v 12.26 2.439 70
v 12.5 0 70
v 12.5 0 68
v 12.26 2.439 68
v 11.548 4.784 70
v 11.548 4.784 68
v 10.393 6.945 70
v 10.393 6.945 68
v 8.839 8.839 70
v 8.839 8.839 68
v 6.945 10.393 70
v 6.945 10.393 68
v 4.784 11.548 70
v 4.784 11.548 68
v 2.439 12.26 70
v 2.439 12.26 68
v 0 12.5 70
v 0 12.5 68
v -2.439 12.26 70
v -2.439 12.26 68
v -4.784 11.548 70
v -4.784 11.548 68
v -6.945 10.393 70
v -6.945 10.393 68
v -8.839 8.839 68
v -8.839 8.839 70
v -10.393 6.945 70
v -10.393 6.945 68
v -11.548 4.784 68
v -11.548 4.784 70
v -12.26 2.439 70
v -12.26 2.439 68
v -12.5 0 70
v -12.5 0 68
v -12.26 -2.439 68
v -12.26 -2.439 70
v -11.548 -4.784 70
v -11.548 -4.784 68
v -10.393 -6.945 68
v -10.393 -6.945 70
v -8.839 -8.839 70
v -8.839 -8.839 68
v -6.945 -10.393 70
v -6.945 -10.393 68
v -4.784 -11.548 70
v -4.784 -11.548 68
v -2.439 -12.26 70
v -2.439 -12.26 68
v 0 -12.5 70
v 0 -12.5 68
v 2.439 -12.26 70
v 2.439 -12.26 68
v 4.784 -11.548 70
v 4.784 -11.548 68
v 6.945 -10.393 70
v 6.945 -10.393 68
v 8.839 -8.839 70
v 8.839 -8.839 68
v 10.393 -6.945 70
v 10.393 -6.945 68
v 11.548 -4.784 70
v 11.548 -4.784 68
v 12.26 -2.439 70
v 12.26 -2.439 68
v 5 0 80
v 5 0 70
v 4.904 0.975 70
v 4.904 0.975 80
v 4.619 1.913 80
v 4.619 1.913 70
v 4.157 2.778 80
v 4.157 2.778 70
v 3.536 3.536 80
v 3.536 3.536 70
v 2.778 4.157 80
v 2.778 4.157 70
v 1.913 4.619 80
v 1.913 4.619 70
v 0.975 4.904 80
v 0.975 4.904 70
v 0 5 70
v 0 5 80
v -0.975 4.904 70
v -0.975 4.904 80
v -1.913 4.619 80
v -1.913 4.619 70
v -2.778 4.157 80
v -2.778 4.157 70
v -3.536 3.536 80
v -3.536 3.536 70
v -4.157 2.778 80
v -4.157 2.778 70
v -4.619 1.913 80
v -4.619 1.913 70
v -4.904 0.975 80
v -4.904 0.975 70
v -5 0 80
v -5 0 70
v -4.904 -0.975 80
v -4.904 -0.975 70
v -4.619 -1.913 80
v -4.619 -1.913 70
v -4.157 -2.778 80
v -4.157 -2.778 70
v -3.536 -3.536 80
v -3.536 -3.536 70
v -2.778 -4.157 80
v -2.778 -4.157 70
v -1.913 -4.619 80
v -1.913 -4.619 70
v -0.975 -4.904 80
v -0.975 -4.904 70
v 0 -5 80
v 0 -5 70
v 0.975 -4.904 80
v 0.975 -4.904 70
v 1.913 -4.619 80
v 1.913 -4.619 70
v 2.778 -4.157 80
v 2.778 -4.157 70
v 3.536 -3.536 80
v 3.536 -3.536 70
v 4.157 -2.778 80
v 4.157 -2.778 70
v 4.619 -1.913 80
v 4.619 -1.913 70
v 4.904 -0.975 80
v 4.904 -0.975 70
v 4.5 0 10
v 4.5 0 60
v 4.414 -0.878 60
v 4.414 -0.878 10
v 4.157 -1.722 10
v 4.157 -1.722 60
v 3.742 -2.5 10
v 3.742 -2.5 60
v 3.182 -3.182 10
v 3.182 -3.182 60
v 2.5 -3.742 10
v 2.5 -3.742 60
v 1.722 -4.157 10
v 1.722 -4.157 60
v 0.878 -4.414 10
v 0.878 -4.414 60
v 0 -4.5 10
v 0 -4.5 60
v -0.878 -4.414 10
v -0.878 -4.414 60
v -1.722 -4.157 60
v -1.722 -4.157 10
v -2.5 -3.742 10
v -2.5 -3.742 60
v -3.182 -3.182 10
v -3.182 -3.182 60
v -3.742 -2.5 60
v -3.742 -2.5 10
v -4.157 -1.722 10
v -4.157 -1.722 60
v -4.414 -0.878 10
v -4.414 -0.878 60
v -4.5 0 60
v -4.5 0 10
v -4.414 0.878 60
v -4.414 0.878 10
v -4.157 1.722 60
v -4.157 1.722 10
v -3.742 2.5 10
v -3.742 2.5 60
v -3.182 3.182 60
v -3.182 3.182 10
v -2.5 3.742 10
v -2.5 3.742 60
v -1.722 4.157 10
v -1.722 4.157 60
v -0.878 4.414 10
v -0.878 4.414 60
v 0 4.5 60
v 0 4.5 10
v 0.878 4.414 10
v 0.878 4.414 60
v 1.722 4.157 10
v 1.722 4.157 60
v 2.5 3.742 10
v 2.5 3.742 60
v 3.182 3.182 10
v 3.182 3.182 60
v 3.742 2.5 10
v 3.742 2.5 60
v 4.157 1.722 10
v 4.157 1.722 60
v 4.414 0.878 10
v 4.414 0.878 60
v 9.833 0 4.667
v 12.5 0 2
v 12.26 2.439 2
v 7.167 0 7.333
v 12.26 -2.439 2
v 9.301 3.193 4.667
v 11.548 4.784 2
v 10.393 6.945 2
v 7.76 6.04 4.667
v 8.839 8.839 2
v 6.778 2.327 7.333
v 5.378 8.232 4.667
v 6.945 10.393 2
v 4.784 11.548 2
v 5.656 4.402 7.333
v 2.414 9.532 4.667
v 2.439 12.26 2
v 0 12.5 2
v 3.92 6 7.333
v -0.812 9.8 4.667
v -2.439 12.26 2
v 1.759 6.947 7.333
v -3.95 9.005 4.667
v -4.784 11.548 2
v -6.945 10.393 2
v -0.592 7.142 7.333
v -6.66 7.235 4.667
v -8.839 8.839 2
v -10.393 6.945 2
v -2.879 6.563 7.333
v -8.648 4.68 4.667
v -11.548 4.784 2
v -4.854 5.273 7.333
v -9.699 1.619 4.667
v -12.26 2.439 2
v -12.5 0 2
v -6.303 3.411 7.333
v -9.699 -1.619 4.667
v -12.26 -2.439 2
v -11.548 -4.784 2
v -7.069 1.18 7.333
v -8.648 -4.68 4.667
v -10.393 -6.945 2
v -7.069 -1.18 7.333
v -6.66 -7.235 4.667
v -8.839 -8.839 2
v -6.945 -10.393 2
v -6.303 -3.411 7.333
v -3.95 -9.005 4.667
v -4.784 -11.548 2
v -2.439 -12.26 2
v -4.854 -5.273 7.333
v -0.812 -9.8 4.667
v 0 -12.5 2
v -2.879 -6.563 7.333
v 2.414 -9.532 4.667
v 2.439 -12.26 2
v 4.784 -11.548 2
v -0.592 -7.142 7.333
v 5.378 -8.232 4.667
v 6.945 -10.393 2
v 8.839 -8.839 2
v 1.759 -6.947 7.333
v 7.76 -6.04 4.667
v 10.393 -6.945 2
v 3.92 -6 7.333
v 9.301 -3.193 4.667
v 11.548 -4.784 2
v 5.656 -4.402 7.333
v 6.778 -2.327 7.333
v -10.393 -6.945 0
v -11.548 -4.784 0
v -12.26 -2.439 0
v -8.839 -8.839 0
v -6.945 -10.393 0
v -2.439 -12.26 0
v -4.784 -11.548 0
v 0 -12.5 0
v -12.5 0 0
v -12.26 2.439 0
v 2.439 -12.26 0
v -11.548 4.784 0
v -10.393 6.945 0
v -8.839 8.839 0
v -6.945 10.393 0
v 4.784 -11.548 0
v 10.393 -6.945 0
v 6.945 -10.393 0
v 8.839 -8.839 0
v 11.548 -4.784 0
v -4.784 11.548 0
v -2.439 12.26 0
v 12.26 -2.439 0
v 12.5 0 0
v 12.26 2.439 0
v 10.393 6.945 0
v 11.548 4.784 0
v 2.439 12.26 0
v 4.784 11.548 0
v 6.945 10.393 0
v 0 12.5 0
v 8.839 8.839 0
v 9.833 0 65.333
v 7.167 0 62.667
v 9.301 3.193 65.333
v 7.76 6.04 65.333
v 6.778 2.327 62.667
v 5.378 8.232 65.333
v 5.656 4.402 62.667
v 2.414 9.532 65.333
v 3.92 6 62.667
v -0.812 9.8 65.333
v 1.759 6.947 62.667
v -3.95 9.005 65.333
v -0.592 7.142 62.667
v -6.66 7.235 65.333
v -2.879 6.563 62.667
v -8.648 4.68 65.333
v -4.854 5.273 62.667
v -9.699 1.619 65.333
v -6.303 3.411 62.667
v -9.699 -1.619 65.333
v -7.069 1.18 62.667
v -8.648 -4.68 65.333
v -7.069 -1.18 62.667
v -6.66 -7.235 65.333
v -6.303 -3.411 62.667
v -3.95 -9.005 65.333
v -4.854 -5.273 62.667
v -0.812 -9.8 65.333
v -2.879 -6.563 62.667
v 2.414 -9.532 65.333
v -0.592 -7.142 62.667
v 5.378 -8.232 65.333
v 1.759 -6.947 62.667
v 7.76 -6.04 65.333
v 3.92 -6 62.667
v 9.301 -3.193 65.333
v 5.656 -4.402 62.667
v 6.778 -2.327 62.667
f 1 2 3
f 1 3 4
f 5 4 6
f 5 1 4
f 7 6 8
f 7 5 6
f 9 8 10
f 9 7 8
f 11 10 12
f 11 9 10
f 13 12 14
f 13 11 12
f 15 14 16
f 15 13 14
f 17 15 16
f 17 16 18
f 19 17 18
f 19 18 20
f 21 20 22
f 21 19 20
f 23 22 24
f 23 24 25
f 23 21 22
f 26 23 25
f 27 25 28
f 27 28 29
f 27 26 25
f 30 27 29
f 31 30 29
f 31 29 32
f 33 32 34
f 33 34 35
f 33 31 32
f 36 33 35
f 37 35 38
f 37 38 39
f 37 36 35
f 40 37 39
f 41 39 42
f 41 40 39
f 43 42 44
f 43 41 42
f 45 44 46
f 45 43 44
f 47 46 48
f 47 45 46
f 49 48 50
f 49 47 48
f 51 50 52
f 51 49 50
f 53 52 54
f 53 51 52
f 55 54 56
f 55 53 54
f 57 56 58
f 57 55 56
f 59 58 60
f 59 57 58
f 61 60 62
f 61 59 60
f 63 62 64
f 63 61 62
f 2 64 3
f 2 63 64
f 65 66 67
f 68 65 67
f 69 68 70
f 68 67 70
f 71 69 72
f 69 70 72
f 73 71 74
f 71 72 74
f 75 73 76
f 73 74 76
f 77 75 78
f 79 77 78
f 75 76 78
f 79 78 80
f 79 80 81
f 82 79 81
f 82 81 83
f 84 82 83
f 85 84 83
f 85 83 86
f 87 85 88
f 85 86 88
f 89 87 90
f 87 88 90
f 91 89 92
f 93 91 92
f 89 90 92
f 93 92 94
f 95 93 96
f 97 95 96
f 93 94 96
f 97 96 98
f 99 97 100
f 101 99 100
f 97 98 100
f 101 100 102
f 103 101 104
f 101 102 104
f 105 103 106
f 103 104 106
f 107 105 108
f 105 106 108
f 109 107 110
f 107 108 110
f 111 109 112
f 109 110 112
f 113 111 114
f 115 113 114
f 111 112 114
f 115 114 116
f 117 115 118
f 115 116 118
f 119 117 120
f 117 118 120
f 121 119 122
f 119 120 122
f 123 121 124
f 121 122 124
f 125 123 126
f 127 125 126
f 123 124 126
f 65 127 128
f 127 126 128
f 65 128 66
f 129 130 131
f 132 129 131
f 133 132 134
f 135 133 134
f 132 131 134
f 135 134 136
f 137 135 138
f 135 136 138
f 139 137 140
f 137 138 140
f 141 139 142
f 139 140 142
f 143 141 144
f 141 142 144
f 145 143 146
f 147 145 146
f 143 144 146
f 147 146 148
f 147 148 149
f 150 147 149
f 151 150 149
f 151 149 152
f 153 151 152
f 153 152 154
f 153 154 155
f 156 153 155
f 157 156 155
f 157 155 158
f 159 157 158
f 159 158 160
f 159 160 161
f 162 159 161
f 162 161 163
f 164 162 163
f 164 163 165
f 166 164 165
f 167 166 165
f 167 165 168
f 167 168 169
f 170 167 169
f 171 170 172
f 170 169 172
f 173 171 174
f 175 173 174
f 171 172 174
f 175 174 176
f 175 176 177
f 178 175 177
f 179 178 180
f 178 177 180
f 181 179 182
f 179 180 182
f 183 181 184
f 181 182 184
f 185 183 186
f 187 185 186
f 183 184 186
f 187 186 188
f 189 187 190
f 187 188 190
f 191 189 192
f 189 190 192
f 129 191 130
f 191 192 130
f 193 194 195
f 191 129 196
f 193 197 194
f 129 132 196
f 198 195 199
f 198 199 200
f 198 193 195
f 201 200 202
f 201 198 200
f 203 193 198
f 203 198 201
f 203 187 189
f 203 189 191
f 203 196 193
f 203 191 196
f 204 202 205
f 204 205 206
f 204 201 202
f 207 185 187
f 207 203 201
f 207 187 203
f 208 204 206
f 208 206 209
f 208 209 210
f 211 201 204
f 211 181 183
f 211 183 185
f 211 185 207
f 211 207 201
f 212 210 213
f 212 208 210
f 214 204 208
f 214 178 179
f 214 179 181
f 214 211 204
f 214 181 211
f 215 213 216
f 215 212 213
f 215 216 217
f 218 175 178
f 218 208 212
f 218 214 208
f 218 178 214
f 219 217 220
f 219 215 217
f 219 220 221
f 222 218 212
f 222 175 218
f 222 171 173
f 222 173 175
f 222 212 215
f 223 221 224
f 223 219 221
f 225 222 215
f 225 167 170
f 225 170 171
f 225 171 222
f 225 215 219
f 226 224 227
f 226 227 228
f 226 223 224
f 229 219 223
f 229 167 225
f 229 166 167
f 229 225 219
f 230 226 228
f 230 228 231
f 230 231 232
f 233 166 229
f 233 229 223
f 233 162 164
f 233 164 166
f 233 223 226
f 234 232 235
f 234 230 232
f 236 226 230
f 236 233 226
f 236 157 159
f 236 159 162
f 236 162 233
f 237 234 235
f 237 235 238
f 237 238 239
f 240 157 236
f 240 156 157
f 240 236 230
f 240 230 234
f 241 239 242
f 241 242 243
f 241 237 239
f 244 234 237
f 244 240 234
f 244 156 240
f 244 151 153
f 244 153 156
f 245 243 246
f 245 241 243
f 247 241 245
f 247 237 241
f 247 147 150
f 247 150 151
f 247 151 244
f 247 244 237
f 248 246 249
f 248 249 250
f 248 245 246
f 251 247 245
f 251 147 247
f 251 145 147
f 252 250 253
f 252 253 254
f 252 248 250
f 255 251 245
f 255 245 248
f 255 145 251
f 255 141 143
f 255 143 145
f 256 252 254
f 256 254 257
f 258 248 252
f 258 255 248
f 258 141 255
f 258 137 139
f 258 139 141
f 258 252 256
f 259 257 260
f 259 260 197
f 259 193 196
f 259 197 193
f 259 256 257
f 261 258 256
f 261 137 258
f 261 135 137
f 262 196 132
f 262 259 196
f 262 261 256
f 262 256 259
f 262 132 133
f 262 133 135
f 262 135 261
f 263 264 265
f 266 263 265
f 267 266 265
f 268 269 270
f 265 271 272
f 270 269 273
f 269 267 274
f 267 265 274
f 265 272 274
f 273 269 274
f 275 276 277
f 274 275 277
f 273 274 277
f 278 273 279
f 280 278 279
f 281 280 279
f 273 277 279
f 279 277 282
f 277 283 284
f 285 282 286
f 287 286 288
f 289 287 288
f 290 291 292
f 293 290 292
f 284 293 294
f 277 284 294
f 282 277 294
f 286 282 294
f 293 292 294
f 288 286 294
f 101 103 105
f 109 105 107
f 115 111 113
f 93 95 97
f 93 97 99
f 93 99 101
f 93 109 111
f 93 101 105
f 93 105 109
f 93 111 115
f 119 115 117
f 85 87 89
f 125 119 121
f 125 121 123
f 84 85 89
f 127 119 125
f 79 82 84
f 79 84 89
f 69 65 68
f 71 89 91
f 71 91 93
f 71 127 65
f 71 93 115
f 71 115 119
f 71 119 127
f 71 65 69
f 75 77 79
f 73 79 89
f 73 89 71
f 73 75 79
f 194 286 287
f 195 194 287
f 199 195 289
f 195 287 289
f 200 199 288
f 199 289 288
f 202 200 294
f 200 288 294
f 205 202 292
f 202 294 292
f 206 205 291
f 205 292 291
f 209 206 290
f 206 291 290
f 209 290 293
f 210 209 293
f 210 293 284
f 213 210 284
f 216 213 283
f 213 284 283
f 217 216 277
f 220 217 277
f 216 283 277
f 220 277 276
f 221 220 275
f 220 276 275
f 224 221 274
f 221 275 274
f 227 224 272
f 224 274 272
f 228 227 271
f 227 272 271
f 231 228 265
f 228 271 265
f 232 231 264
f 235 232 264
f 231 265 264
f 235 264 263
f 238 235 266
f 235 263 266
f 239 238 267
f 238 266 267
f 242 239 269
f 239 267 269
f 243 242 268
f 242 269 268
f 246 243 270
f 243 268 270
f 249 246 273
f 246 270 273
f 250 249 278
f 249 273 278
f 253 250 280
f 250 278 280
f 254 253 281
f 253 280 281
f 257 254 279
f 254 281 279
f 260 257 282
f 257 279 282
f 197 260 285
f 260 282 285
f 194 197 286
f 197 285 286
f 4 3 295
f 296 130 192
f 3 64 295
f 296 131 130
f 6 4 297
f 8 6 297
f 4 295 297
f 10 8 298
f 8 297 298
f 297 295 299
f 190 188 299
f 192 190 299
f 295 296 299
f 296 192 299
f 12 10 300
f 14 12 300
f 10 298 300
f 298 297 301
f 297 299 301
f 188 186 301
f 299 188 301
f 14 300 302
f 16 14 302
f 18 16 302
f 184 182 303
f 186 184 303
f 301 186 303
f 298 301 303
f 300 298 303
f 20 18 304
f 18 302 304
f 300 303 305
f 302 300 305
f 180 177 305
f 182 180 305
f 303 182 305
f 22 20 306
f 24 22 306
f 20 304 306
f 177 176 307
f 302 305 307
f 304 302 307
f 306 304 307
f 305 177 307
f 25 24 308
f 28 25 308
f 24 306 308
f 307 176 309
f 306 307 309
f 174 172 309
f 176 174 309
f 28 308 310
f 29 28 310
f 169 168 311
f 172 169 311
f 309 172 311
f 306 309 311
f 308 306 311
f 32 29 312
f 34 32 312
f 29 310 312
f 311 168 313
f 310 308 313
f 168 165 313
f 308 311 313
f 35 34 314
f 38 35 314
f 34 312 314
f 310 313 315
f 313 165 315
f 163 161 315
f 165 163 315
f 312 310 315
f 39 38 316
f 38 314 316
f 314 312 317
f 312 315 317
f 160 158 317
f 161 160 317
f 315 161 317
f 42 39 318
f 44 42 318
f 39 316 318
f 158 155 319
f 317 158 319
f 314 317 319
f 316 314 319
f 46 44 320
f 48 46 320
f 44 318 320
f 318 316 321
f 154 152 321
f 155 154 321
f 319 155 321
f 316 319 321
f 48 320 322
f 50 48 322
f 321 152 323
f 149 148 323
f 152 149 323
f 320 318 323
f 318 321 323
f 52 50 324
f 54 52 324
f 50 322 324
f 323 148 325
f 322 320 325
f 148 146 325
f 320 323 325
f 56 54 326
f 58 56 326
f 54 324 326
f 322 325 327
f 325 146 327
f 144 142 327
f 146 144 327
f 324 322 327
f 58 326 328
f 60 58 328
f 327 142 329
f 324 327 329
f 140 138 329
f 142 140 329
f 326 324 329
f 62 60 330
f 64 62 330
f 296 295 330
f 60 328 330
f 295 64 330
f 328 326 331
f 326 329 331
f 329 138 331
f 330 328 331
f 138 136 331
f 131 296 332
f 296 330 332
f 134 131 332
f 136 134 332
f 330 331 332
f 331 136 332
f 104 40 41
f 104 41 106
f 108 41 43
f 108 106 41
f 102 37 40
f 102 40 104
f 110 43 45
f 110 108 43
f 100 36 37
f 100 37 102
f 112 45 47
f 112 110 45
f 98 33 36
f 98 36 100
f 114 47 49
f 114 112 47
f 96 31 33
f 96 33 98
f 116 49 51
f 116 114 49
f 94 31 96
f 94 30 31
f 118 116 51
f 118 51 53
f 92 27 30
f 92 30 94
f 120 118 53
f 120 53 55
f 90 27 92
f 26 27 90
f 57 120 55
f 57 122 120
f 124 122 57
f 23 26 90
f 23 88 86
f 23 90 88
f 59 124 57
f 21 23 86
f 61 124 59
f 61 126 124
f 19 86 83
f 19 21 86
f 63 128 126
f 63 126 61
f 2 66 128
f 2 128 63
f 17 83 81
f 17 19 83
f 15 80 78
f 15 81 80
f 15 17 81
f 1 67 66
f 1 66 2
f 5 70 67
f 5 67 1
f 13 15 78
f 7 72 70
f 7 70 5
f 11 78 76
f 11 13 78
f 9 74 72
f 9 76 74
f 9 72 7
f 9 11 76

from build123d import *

# Parameters (mm, degrees)
F0_R      = 12.5
F1_DEPTH  = 2
F1_FACE_R = 12.5
F2_DEPTH  = 8
F2_TAPER  = 45
F3_DEPTH  = 25
F5_R      = 5
F6_DEPTH  = 10


with BuildPart() as f1:
    # F0 (on Top) → F1 (new body)
    with BuildSketch(Plane.XY):
        Circle(F0_R)
    extrude(amount=F1_DEPTH)

    # F1_face (on face) → F2 (join)
    with BuildSketch(Plane.XY.offset(2)):
        Circle(F1_FACE_R)
    extrude(amount=F2_DEPTH, taper=F2_TAPER)

    # F3 (add): a face of the model
    f3_faces = [f1.faces().sort_by_distance(p)[0] for p in [
        (0, 0, 10),
    ]]
    extrude(f3_faces, amount=F3_DEPTH)

    # F4: F1 across face


with BuildPart() as f1_1:
    add(f1.part)
    add(f1.part.mirror(Plane.XY.offset(35)))

    # F5 (on face) → F6 (join)
    with BuildSketch(Plane.XY.offset(70)):
        Circle(F5_R)
    extrude(amount=F6_DEPTH)


solid = f1_1.part
